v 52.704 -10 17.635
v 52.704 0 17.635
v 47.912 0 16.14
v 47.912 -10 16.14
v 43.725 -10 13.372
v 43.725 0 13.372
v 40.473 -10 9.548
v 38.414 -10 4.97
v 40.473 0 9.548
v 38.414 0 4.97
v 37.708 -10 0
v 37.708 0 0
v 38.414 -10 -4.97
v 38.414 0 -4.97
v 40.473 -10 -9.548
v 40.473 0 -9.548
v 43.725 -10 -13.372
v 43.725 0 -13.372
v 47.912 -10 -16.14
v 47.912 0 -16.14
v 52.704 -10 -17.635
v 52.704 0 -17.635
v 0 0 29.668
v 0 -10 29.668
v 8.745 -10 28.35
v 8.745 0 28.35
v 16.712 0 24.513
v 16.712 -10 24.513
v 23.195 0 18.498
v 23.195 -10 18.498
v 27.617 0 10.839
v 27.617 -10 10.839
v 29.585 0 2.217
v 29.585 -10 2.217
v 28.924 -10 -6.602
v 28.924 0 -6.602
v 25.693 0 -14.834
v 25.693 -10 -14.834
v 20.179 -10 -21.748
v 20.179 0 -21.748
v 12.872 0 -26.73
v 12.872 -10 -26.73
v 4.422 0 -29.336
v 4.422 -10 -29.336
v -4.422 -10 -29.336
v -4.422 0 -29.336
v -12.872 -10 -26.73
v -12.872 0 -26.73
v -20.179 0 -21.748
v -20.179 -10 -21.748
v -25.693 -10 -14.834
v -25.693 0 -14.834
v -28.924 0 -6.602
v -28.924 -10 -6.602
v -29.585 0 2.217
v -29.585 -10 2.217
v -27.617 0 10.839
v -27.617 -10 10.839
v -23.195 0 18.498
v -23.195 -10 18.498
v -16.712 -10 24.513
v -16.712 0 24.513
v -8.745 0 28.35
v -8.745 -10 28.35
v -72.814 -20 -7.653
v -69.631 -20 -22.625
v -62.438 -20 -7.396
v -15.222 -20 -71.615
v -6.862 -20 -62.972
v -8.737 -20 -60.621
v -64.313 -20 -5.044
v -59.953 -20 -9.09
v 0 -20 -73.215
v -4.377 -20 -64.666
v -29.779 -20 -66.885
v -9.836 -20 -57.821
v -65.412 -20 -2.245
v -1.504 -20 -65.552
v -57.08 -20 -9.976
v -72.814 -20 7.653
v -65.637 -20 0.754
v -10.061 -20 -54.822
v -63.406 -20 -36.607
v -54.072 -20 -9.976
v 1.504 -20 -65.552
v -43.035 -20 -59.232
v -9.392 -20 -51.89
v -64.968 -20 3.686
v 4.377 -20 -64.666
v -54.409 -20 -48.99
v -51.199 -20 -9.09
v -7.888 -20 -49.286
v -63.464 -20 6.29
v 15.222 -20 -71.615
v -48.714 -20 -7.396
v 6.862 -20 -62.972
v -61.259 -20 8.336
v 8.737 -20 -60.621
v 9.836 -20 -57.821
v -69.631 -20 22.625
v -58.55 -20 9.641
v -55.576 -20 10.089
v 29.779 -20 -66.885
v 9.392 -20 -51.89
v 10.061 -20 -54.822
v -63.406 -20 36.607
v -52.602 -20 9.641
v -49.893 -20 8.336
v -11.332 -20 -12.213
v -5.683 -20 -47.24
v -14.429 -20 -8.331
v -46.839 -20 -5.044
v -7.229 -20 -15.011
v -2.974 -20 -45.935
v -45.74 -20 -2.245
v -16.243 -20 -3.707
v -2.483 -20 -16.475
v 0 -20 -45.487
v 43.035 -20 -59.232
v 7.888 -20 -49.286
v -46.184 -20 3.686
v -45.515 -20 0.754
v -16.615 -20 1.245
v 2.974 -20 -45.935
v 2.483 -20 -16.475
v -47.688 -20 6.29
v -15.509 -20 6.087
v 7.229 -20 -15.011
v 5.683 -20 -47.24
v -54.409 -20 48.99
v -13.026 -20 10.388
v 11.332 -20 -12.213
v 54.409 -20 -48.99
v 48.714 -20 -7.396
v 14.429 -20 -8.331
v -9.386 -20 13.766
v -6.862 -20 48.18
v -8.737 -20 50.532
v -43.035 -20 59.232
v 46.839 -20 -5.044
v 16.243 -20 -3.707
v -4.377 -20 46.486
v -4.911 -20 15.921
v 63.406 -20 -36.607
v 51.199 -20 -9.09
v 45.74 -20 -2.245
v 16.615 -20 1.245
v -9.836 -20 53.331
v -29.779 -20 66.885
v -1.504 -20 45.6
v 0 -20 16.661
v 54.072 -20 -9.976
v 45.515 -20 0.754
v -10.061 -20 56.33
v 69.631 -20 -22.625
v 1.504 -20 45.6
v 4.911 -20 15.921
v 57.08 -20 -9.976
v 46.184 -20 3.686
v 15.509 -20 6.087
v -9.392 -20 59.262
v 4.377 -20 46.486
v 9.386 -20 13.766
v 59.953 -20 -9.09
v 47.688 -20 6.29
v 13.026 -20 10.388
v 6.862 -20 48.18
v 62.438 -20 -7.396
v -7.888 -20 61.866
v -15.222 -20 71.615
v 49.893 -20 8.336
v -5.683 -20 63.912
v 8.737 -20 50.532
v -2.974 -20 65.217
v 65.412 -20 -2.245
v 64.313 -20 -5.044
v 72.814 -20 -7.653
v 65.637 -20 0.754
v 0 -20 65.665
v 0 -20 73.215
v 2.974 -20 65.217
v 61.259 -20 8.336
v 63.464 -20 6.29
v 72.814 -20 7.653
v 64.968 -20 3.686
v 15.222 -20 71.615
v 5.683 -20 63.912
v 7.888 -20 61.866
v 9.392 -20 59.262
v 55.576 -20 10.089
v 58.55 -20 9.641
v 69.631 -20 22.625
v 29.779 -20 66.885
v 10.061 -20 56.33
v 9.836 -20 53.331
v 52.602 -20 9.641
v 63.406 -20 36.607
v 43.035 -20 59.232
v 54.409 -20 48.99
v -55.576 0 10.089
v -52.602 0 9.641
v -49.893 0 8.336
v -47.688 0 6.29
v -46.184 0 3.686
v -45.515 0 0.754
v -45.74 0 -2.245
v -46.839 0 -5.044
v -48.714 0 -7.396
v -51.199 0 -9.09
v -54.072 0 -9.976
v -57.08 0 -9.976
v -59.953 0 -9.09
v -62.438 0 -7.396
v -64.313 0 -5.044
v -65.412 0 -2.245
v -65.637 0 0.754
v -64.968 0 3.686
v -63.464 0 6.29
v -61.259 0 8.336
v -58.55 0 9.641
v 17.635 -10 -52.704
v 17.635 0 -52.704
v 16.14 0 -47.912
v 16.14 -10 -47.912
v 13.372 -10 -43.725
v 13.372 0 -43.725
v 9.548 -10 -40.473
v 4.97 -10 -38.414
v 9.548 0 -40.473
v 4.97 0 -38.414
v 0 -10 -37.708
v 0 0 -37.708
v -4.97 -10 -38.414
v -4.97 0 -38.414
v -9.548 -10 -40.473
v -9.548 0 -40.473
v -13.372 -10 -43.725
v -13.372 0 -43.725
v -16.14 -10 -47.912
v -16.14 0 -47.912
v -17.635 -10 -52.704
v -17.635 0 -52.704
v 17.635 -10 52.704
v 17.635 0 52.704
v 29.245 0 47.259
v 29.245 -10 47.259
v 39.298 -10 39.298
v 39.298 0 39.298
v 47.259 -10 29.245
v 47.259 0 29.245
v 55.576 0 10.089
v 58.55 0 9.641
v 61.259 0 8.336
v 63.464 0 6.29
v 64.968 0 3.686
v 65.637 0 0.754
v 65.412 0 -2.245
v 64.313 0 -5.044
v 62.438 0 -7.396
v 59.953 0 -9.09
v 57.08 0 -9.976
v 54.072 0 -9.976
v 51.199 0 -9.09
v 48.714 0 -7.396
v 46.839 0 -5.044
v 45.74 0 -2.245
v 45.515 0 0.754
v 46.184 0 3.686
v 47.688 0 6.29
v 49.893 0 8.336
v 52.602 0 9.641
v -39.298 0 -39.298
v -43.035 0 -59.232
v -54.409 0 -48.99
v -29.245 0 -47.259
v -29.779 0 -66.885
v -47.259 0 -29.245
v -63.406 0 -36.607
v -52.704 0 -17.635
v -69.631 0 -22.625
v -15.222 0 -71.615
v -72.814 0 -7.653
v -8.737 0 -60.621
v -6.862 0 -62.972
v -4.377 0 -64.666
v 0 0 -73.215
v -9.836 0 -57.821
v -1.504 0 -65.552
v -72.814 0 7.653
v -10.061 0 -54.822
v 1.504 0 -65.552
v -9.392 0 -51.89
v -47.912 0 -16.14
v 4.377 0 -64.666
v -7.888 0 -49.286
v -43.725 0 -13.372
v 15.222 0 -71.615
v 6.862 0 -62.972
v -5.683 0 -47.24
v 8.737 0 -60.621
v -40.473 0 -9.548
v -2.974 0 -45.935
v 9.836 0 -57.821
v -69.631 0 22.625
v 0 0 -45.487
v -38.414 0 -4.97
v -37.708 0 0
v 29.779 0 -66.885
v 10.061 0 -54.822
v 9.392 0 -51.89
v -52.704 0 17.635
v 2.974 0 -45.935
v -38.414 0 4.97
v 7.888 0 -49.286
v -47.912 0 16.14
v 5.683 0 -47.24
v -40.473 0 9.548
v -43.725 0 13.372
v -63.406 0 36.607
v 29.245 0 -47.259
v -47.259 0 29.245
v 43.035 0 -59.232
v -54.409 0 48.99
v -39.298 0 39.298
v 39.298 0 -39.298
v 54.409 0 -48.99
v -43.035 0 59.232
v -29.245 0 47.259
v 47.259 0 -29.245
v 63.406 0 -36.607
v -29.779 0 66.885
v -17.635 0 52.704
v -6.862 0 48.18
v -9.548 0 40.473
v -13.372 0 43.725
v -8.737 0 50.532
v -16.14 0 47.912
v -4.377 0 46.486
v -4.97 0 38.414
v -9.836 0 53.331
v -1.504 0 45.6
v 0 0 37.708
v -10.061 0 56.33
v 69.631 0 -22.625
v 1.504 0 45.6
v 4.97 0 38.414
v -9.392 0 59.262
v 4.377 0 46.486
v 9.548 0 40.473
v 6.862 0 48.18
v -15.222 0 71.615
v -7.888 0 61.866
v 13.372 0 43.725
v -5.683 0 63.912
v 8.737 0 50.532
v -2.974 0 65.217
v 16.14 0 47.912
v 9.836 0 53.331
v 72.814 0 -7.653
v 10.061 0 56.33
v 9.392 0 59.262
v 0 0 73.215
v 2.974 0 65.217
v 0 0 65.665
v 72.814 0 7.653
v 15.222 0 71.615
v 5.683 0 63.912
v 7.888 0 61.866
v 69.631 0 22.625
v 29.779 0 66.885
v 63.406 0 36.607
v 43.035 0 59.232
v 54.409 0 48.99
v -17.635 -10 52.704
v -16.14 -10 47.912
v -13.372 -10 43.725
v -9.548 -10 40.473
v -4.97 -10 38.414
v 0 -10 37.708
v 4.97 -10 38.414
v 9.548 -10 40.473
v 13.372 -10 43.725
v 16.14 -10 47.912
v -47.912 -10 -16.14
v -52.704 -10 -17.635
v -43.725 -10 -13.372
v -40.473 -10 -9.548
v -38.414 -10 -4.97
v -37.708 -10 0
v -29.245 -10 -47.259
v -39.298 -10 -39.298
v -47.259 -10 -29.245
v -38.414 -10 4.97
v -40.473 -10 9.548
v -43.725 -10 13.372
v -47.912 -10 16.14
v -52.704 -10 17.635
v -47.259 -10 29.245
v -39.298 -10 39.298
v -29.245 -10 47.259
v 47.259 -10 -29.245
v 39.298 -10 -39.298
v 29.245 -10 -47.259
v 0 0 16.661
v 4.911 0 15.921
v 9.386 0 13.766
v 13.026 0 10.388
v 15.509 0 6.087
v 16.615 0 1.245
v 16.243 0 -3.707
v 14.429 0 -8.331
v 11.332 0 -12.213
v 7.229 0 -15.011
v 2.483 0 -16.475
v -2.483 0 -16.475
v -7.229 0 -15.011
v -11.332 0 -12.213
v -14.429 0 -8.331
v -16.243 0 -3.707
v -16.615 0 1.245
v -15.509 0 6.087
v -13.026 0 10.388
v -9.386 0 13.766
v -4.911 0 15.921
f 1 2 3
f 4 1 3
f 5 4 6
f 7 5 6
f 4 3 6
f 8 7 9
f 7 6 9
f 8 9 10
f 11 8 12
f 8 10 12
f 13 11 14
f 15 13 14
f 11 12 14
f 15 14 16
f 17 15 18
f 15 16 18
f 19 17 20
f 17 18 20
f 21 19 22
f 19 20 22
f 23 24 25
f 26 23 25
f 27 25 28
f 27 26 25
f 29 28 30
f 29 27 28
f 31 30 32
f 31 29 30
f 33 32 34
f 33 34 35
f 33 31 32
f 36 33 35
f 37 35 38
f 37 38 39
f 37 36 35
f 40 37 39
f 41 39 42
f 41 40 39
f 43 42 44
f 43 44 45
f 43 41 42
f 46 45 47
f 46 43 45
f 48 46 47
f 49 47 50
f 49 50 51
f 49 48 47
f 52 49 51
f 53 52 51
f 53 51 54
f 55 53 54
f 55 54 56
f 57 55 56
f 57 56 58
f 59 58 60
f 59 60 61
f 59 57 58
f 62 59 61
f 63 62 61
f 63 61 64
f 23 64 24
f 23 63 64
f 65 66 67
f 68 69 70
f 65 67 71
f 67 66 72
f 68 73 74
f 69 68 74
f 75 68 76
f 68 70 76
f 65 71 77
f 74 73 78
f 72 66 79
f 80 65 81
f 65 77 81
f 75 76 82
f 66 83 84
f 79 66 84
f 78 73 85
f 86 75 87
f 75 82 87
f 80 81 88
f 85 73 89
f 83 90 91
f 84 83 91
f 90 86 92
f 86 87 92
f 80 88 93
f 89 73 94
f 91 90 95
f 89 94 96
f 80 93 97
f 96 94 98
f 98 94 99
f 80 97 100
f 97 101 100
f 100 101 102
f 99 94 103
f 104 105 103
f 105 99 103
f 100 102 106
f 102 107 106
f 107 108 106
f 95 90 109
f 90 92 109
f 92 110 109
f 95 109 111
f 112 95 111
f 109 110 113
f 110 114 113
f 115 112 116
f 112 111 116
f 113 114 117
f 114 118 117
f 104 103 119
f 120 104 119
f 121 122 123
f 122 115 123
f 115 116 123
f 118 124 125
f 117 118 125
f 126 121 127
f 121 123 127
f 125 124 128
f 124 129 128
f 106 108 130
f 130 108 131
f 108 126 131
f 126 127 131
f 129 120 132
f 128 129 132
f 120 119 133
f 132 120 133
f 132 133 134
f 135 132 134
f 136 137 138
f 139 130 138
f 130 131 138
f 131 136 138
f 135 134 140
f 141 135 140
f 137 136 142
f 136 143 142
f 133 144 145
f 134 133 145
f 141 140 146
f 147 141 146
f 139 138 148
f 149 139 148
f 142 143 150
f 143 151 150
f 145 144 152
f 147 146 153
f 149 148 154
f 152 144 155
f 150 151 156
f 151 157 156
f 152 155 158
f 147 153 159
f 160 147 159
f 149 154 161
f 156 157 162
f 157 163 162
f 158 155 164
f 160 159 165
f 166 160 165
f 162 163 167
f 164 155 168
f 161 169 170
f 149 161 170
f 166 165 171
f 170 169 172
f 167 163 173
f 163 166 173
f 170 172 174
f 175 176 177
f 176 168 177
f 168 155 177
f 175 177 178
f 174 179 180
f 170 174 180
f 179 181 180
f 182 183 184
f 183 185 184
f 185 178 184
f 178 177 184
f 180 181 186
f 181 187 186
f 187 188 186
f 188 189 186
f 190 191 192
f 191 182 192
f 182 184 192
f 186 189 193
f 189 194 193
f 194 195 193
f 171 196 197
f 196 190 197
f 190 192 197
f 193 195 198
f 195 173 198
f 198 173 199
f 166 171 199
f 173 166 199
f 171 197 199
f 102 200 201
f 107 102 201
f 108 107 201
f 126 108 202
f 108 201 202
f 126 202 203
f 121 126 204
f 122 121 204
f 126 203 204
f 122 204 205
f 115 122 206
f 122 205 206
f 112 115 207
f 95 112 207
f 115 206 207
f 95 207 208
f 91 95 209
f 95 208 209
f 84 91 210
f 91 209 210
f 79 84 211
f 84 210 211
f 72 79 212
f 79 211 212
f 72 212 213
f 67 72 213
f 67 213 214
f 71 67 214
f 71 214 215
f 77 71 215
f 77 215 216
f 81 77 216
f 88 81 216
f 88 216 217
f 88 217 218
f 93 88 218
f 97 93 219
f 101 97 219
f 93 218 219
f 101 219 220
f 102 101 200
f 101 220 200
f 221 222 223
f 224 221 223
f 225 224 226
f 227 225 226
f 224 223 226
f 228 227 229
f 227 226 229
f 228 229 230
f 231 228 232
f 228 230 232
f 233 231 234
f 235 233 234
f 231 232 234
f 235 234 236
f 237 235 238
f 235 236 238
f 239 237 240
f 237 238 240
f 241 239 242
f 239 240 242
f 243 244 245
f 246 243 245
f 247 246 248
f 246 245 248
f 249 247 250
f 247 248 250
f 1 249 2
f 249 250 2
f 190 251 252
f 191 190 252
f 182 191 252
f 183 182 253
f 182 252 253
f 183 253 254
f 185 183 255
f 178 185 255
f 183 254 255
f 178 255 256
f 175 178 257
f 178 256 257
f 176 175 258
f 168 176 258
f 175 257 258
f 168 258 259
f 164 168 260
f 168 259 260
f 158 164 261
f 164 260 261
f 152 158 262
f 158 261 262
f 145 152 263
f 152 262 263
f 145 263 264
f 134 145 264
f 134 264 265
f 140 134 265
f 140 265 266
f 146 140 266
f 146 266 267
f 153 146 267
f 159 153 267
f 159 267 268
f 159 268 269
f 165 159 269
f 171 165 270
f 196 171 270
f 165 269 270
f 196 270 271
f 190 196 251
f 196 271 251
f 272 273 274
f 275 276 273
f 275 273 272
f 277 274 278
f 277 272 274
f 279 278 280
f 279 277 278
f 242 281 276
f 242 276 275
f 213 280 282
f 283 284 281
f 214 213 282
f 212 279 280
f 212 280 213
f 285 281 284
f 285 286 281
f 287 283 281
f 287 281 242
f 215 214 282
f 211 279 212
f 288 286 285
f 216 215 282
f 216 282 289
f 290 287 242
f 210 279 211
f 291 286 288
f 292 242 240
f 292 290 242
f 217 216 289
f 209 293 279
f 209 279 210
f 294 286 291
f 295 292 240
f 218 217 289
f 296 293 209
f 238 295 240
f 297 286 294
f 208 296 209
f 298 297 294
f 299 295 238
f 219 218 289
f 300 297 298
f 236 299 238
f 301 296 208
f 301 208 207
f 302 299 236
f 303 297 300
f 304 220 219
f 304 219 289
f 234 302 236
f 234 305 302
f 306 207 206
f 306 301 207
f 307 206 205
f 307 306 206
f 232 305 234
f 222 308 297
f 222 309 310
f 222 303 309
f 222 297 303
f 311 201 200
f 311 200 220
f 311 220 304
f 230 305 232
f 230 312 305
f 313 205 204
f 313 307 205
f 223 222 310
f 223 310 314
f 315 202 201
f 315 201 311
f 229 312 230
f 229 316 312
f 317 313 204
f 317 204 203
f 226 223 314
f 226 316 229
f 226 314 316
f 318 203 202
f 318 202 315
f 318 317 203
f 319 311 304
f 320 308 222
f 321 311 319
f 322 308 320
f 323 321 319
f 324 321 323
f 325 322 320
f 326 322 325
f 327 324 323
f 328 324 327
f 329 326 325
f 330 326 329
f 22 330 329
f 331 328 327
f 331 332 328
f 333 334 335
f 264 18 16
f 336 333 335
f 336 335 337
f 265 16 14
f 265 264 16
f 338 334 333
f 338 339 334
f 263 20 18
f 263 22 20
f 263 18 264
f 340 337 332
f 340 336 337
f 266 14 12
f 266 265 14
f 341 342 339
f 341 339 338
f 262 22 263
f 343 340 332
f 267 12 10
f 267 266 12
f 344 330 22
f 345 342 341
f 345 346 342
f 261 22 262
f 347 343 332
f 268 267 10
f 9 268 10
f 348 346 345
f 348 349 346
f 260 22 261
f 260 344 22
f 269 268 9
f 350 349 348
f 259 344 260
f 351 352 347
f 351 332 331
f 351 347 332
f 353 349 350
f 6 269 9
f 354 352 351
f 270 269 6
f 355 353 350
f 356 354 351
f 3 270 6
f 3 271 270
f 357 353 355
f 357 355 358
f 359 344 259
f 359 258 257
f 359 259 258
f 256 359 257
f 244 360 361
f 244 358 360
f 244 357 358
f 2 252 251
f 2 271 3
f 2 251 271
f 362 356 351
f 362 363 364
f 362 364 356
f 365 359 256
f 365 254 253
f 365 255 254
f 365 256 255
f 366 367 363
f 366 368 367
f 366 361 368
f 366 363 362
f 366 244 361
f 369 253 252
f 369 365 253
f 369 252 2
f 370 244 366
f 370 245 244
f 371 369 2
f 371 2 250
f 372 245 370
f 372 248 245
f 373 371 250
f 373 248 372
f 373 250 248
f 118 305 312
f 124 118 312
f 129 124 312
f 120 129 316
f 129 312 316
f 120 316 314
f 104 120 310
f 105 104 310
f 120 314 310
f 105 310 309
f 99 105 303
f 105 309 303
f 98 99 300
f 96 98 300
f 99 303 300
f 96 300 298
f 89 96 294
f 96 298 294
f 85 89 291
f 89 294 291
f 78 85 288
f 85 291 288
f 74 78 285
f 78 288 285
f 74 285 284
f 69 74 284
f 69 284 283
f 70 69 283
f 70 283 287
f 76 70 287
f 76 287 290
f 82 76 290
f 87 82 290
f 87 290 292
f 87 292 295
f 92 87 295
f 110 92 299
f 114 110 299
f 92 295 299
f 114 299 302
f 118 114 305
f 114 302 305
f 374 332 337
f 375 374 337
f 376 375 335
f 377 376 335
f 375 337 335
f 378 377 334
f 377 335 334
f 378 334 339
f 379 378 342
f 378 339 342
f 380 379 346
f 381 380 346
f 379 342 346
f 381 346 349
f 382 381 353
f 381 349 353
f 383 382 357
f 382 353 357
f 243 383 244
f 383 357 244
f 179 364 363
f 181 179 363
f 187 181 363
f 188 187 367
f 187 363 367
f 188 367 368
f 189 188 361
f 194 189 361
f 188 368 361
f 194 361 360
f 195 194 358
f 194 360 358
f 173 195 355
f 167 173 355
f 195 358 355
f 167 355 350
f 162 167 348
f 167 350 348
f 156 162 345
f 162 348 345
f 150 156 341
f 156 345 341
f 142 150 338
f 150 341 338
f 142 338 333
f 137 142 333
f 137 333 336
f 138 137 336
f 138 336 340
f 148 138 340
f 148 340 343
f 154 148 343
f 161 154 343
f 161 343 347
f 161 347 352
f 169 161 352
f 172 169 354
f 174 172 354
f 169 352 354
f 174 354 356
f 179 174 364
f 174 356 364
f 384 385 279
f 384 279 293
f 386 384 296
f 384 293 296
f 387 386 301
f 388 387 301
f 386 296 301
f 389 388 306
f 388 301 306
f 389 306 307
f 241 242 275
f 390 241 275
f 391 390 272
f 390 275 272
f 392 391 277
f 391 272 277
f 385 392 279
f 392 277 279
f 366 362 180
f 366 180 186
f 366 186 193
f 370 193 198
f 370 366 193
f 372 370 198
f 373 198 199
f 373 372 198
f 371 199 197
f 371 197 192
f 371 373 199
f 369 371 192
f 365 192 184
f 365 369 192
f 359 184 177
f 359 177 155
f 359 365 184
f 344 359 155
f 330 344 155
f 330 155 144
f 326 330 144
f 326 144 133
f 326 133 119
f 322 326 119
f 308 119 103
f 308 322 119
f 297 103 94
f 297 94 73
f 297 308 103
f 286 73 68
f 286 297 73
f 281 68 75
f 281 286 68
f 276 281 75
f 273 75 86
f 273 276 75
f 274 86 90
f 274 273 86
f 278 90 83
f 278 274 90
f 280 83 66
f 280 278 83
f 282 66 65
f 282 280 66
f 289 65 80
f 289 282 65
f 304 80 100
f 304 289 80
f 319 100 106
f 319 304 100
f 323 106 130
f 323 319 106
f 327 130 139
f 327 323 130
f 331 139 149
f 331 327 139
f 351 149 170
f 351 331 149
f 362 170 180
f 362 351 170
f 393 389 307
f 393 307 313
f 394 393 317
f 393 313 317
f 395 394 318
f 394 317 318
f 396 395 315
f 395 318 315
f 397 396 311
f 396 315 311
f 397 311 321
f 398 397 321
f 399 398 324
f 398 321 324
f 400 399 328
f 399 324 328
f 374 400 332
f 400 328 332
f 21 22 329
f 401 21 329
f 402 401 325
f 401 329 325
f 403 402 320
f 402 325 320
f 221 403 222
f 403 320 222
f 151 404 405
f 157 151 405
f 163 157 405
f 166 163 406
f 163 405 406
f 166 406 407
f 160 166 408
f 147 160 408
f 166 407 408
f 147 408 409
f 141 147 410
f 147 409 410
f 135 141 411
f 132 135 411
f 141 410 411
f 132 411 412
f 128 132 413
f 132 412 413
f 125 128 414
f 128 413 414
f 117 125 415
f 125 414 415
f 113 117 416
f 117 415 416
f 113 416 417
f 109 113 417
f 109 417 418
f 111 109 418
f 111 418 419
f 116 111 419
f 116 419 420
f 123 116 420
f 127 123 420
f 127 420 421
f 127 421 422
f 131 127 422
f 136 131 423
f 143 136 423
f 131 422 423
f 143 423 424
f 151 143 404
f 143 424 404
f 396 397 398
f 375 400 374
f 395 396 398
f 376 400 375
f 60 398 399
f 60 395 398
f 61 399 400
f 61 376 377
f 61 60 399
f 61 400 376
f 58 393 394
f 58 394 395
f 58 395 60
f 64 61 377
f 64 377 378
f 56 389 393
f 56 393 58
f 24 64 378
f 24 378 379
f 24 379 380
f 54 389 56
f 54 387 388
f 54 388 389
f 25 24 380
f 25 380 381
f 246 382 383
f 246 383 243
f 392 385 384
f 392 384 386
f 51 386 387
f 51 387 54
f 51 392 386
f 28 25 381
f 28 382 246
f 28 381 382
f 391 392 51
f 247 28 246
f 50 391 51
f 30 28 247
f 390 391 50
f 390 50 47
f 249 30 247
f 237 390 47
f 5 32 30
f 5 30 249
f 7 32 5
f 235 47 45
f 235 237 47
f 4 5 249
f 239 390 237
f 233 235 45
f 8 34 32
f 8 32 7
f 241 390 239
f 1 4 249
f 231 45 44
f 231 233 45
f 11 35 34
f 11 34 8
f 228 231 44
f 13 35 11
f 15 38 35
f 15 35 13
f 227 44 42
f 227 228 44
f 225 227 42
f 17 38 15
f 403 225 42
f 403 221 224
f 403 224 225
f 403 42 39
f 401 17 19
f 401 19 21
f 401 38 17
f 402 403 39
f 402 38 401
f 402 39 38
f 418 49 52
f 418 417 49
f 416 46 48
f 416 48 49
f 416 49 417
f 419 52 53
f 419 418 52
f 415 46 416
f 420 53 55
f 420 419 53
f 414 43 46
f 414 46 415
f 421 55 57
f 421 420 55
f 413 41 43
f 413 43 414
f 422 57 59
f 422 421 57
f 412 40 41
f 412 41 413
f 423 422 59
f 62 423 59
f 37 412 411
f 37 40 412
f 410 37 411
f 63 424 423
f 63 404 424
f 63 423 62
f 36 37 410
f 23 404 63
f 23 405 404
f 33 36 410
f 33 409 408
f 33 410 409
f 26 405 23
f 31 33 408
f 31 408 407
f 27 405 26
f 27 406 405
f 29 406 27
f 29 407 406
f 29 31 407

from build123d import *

# Parameters (mm, degrees)
SKETCH1_R           = 73.214752718
BOSS_EXTRUDE4_DEPTH = 20
SKETCH1_7_R         = 10.088971545
SKETCH1_7_R_2       = 16.661107431
CUT_EXTRUDE2_DEPTH  = 20
SKETCH1_8_R         = 29.667707344
CUT_EXTRUDE3_DEPTH  = 10


with BuildPart() as part:
    # Sketch1 → Boss-Extrude4 (new body)
    with BuildSketch(Plane(origin=(0, 0, 0), x_dir=(1, 0, 0), z_dir=(0, 1, 0))):
        Circle(SKETCH1_R)
    extrude(amount=-BOSS_EXTRUDE4_DEPTH)

    # Sketch1<7> → Cut-Extrude2 (cut)
    with BuildSketch(Plane(origin=(0, 0, 0), x_dir=(1, 0, 0), z_dir=(0, 1, 0))):
        with Locations((55.576015856, 0)):
            Circle(SKETCH1_7_R)
        with Locations((0, 55.576015856)):
            Circle(SKETCH1_7_R)
        with Locations((0, -55.576015856)):
            Circle(SKETCH1_7_R)
        with Locations((-55.576015856, 0)):
            Circle(SKETCH1_7_R)
        Circle(SKETCH1_7_R_2)
    extrude(amount=-CUT_EXTRUDE2_DEPTH, mode=Mode.SUBTRACT)

    # Sketch1<8> → Cut-Extrude3 (cut)
    with BuildSketch(Plane(origin=(0, 0, 0), x_dir=(1, 0, 0), z_dir=(0, 1, 0))):
        with BuildLine():
            ThreePointArc((52.703821385, -17.635213348), (37.708440449, 0), (52.703821385, 17.635213348))
            ThreePointArc((52.703821385, 17.635213348), (39.298177683, 39.298177683), (17.635213348, 52.703821385))
            ThreePointArc((17.635213348, 52.703821385), (0, 37.708440449), (-17.635213348, 52.703821385))
            ThreePointArc((-17.635213348, 52.703821385), (-39.298177683, 39.298177683), (-52.703821385, 17.635213348))
            ThreePointArc((-52.703821385, 17.635213348), (-41.96408355, 11.574348786), (-37.708440449, 0))
            ThreePointArc((-37.708440449, 0), (-41.96408355, -11.574348786), (-52.703821385, -17.635213348))
            ThreePointArc((-52.703821385, -17.635213348), (-39.298177683, -39.298177683), (-17.635213348, -52.703821385))
            ThreePointArc((-17.635213348, -52.703821385), (0, -37.708440449), (17.635213348, -52.703821385))
            ThreePointArc((17.635213348, -52.703821385), (39.298177683, -39.298177683), (52.703821385, -17.635213348))
        make_face()
        Circle(SKETCH1_8_R, mode=Mode.SUBTRACT)
    extrude(amount=-CUT_EXTRUDE3_DEPTH, mode=Mode.SUBTRACT)


solid = part.part
